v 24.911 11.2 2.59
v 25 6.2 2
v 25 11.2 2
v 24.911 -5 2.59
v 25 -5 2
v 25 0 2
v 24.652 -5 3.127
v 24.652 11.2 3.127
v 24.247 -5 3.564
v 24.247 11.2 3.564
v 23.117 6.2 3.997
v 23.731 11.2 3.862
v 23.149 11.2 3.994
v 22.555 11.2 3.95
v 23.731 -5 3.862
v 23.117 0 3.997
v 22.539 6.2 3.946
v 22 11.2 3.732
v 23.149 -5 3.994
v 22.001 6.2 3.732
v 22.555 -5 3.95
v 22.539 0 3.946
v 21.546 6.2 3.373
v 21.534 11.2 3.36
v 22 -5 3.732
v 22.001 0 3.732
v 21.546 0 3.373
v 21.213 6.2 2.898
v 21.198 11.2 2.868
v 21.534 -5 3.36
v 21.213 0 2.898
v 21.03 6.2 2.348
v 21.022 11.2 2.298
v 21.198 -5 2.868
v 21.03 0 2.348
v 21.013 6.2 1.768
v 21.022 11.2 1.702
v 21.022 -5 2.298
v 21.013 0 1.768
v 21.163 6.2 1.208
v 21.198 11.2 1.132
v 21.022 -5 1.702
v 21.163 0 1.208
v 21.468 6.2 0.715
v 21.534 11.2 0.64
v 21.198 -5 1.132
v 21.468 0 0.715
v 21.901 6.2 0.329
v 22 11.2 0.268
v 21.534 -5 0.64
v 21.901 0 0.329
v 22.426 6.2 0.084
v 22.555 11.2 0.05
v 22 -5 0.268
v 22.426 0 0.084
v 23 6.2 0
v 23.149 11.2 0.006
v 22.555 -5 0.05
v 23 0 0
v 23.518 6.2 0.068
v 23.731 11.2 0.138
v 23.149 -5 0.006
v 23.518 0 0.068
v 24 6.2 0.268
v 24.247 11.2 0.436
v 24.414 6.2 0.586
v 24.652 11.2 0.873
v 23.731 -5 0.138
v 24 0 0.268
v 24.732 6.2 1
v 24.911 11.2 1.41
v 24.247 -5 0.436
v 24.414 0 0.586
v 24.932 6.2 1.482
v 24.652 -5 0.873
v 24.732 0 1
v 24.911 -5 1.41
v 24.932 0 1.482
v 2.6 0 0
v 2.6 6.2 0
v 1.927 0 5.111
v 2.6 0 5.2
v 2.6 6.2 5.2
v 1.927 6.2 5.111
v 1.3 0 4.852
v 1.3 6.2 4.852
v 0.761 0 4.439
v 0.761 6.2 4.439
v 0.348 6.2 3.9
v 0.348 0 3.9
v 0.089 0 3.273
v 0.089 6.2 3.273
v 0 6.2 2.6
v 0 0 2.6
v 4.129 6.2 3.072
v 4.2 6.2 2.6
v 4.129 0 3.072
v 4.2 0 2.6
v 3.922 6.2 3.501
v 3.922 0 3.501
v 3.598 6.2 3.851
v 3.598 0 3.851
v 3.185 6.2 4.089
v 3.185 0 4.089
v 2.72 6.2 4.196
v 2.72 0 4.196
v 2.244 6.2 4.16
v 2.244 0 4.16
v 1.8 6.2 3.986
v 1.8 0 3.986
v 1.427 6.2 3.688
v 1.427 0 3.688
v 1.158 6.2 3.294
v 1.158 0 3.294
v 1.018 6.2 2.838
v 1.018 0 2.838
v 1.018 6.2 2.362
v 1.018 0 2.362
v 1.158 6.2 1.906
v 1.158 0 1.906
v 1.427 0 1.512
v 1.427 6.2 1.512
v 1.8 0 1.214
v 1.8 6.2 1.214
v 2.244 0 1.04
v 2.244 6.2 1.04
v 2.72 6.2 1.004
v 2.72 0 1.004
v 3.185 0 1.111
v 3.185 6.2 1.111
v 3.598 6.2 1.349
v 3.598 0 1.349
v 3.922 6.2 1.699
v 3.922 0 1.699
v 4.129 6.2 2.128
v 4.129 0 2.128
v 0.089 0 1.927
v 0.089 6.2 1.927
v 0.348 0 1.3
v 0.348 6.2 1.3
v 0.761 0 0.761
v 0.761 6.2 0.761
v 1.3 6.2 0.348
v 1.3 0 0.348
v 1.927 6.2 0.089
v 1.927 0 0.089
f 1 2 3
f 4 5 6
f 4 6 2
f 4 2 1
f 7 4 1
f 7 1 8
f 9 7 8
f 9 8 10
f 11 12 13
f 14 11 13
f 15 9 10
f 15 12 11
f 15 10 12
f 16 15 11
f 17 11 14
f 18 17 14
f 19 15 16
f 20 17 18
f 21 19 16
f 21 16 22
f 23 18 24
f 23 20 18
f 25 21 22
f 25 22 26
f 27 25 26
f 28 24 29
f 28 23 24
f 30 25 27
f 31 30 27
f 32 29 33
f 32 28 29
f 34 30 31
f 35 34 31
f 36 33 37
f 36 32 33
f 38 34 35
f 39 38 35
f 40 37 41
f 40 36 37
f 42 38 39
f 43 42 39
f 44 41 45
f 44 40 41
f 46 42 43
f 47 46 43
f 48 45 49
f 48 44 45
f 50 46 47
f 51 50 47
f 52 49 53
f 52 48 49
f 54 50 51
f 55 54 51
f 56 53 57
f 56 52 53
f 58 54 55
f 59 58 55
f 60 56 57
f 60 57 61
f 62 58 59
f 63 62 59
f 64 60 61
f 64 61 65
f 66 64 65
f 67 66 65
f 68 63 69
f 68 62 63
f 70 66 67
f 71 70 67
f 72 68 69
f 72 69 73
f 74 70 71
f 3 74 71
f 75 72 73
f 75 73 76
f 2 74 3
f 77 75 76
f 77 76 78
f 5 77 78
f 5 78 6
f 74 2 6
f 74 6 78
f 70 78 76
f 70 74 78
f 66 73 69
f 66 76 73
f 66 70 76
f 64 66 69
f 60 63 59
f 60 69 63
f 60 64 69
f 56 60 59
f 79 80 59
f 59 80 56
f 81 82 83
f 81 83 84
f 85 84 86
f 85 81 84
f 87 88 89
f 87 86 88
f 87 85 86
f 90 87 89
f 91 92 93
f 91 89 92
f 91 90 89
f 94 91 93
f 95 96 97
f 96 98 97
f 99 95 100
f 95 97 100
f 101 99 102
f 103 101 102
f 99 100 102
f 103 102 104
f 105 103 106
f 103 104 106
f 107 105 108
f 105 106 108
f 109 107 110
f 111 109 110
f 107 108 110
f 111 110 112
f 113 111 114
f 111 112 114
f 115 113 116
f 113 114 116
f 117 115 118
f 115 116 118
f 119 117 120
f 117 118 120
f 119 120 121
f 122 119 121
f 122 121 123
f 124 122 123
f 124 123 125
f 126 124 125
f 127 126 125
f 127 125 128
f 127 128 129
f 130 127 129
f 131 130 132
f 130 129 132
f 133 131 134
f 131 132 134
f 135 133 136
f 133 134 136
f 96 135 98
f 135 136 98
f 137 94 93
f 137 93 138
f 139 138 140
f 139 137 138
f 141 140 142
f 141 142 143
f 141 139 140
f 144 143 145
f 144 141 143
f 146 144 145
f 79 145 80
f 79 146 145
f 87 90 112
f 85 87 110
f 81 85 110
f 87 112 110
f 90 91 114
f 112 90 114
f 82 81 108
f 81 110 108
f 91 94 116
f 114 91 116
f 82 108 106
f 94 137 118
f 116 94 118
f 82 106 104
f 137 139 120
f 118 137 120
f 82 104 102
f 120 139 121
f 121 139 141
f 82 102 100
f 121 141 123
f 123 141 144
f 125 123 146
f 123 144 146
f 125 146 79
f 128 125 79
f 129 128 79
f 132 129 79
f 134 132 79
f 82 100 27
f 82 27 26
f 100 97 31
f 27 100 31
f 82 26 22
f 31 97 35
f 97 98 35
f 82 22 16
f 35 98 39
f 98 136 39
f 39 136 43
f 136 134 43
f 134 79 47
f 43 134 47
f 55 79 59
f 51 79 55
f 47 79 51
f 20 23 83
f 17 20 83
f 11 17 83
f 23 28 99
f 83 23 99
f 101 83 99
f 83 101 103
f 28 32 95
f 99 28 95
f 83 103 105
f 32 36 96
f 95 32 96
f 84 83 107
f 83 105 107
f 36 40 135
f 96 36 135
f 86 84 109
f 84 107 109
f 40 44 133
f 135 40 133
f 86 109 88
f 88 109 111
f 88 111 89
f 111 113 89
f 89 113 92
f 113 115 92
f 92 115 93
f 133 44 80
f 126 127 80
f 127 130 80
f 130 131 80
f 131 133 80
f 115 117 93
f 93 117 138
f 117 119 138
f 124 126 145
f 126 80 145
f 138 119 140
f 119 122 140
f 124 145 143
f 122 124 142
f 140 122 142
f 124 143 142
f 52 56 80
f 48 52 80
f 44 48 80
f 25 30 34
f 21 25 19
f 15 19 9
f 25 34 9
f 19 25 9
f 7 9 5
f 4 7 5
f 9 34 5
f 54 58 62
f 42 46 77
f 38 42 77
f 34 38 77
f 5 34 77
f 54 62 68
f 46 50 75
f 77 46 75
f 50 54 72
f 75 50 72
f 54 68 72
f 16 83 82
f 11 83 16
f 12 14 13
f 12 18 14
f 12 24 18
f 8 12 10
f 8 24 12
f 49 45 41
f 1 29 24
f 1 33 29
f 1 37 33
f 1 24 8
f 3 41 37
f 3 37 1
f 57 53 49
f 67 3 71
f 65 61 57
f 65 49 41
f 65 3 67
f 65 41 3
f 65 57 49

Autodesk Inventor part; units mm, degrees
ref_plane "YZ Plane" through (0, 0, 0) normal (1, 0, 0) x (0, 1, 0)
ref_plane "XZ Plane" through (0, 0, 0) normal (0, 1, 0) x (-1, 0, 0)
ref_plane "XY Plane" through (0, 0, 0) normal (0, 0, 1) x (1, 0, 0)
sketch "Sketch1" plane through (0, 0, 0) normal (0, 0, 1) x (1, 0, 0)
  line L0 (0, 0) -> (25, 0)
  line L1 (25, 0) -> (25, 6.2)
  line L2 (25, 6.2) -> (0, 6.2)
  line L3 (0, 6.2) -> (0, 0)
  point P0 (25, 3.1)
  dimension "d0" = 6.2
  dimension "d1" = 25
extrude "Extrusion1" add sketch "Sketch1" along normal blind 5.2
sketch "Sketch2" plane through (0, 0, 0) normal (0, -1, 0) x (1, 0, 0)
  circle A0 centre (2.6, 2.6) radius 1.6
  line L0 (0, 0) -> (0, 5.2) projected
  line L1 (0, 5.2) -> (25, 5.2) projected
  dimension "d4" = 3.2
  dimension "d5" = 2.6
  dimension "d6" = 2.6
extrude "Extrusion2" cut sketch "Sketch2" against normal blind 6.5
fillet "Fillet1" radius 2.6 2 edges at (0, 3.1, 5.2) (0, 3.1, 0)
sketch "Sketch4" plane through (2.6, 6.2, 0) normal (0, 1, 0) x (1, 0, 0)
  circle A0 centre (20.4, -2) radius 2
  line L0 (22.4, 0) -> (22.4, -5.2) projected
  line L1 (22.4, 0) -> (0, 0) projected
  point P0 (-2.6, 0)
  point P1 (27.4, -4)
  dimension "d13" = 4
  dimension "d14" = 2
  dimension "d15" = 2
extrude "Extrusion4" add sketch "Sketch4" along normal blind 5 and the other way blind 11.2 contours A0
sketch "Sketch5" plane through (2.6, 6.2, 5.2) normal (0, 1, 0) x (1, 0, 0)
  arc A0 (0, 5.2) -> (0, 0) centre (0, 2.6) ccw projected
  line L0 (0, 0) -> (22.4, 1.3139)
  line L1 (22.4, 3.2) -> (22.4, 0) projected
  circle A1 centre (20.4, 3.2) radius 2 projected
  line L2 (22.4, 1.3139) -> (22.4, 0)
  line L3 (22.4, 0) -> (0, 0)
  circle A2 centre (20.4, 3.2) radius 2
  line L4 (22.4, 1.3139) -> (22.4, 3.2)
  point P0 (-2.6, 5.2)
  point P1 (20.5171, 1.2034)
extrude "Extrusion5" cut sketch "Sketch5" against normal blind 6.2 contours L0 L1 L3 | A1 L1 L0
fillet "Fillet2" radius 2 1 edges at (25, 3.1, 0)
properties part number "Latch"
